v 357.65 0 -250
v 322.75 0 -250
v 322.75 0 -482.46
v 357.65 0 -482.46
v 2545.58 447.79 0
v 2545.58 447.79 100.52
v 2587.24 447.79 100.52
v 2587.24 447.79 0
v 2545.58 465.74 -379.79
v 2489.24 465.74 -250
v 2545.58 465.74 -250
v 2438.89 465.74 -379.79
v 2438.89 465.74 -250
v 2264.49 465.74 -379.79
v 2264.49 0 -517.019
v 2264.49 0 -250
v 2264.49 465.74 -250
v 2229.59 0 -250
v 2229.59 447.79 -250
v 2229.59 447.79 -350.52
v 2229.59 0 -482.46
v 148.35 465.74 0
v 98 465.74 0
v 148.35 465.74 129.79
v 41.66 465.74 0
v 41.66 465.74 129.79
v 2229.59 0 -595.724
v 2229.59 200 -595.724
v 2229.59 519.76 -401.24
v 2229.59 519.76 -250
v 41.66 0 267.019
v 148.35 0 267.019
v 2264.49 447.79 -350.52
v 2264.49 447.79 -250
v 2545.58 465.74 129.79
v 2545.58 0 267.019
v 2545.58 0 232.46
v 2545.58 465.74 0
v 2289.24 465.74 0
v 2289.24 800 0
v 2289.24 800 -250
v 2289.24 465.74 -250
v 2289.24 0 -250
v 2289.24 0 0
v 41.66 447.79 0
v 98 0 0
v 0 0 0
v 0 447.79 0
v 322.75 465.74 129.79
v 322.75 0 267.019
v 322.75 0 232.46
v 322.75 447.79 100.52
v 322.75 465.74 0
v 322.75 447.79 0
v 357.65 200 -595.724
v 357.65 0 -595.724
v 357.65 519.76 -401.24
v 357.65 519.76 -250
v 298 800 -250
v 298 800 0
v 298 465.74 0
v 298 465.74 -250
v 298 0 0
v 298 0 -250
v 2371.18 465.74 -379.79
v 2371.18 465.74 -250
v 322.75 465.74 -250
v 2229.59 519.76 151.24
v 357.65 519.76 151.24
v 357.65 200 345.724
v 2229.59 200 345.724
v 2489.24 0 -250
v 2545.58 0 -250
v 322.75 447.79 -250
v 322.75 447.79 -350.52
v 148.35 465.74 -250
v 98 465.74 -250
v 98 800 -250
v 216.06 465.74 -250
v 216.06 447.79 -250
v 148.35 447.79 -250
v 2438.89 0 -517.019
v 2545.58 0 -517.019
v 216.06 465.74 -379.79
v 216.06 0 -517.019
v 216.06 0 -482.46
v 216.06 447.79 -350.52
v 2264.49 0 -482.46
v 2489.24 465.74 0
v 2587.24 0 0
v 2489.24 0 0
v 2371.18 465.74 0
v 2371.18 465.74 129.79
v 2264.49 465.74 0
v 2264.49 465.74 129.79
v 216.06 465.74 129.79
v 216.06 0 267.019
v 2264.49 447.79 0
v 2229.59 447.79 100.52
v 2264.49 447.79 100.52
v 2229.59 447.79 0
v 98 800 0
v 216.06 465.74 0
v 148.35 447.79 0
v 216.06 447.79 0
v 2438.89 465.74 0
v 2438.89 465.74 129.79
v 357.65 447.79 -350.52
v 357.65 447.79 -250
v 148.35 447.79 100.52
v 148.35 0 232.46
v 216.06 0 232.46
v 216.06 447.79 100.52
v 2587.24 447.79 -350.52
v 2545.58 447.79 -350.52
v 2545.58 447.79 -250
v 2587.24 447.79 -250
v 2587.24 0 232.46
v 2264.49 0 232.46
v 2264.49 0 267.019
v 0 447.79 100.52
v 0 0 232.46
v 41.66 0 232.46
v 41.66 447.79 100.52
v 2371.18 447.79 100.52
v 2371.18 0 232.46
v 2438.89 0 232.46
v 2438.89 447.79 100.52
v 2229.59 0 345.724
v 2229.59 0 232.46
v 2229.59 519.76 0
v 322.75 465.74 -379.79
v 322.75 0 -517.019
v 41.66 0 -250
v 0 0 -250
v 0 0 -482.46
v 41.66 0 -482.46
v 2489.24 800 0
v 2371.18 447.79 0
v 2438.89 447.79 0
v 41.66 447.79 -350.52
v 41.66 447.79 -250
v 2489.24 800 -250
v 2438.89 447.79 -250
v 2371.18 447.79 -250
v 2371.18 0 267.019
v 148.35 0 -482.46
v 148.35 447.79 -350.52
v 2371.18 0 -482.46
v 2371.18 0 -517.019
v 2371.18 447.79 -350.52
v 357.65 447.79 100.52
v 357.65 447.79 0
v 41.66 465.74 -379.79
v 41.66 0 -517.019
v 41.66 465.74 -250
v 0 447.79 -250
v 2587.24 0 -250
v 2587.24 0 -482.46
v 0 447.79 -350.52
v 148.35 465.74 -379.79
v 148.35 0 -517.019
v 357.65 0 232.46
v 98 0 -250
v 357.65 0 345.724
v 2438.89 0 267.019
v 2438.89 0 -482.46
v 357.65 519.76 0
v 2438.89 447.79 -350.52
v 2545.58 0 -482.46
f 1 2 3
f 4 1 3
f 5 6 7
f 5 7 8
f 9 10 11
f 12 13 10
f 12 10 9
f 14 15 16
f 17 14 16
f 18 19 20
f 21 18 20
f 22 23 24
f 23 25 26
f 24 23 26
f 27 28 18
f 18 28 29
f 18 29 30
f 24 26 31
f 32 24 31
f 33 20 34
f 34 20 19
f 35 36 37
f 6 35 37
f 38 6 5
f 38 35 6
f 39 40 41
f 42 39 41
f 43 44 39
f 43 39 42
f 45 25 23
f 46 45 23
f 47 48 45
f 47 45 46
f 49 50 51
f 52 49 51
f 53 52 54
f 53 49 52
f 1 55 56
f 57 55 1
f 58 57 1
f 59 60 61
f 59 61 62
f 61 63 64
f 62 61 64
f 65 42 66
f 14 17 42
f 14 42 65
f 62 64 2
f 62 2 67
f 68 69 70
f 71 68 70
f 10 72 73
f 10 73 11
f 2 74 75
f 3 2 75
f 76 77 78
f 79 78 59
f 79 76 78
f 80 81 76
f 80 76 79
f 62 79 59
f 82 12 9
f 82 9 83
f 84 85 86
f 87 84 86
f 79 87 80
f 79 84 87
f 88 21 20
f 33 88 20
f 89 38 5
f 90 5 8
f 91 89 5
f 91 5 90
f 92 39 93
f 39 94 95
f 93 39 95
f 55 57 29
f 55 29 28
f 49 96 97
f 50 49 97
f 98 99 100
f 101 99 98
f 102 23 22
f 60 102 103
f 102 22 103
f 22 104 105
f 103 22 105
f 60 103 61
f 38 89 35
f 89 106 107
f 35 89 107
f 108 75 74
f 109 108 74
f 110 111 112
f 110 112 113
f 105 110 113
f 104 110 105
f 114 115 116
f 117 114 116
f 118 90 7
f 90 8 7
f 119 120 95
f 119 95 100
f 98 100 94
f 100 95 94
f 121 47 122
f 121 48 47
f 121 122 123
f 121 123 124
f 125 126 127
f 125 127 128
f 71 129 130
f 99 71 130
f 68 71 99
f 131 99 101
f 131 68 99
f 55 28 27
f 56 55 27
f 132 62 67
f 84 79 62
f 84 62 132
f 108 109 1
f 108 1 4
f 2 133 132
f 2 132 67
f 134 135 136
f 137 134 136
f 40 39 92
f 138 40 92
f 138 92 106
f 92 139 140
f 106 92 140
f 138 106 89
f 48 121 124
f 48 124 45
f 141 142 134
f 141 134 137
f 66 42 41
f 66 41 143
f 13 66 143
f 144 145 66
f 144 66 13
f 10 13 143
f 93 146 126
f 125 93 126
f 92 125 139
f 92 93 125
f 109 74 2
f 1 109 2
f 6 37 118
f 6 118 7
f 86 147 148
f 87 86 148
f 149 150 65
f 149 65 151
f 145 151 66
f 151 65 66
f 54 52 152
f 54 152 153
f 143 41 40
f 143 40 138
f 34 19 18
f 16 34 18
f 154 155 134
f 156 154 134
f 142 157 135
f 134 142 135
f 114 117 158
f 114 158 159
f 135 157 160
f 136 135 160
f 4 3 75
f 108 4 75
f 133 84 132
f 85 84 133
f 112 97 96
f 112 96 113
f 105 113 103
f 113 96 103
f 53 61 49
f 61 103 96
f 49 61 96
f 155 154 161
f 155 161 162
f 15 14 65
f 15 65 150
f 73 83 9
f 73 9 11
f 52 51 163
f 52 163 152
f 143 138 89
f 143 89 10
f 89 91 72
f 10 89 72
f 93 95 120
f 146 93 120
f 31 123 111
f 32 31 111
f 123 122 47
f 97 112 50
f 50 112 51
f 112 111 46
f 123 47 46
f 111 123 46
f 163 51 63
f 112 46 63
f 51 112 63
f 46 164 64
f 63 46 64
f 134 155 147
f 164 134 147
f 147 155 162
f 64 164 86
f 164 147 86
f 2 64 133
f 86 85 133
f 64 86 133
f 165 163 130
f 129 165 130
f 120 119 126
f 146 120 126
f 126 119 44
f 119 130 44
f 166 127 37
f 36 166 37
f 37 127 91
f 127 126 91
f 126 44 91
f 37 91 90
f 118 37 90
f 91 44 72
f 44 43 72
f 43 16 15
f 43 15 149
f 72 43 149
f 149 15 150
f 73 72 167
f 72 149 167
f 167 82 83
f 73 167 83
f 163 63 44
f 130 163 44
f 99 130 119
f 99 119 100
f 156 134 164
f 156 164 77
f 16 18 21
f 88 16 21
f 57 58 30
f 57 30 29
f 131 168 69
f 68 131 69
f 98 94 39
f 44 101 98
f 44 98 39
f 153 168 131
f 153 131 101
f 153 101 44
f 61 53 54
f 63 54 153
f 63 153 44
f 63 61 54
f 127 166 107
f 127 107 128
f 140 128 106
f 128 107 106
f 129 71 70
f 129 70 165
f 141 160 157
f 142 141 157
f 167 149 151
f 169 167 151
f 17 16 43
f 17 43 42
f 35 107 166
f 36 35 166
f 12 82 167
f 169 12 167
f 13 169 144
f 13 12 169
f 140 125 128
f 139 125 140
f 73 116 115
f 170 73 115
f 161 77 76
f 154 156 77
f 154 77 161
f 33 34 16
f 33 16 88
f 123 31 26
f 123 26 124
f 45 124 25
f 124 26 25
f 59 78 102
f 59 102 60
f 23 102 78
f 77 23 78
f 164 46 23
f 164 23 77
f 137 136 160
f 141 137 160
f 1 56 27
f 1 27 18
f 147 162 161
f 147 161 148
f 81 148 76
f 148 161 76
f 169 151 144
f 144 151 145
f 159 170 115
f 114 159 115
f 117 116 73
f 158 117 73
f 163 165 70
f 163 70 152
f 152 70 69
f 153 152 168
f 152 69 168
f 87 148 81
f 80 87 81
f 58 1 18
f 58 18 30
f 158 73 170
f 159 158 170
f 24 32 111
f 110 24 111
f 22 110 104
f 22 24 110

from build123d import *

# Parameters (mm, degrees)
EXTRUDE_1_DEPTH   = 41.66
EXTRUDE_1_2_DEPTH = 41.66
EXTRUDE_2_DEPTH   = 106.69
EXTRUDE_START     = 148.35
EXTRUDE_3_DEPTH   = 67.71
EXTRUDE_START_2   = 174.4
EXTRUDE_4_DEPTH   = 106.69
EXTRUDE_START_3   = 322.75
EXTRUDE_5_DEPTH   = 34.9
EXTRUDE_6_DEPTH   = 1871.94
EXTRUDE_START_4   = 2229.59
EXTRUDE_9_DEPTH   = 34.9
EXTRUDE_START_5   = 2222.83
EXTRUDE_10_DEPTH  = 106.69
EXTRUDE_START_6   = 2371.18
EXTRUDE_11_DEPTH  = 67.71
EXTRUDE_START_7   = 2397.23
EXTRUDE_12_DEPTH  = 106.69
EXTRUDE_START_8   = 2545.58
EXTRUDE_13_DEPTH  = 41.66
SKETCH_4_W        = 200
SKETCH_4_H        = 250
EXTRUDE_14_DEPTH  = 800


with BuildPart() as part:
    # 草图1 → 凸台-拉伸1 (new body)
    with BuildSketch(Plane(origin=(0, 0, 0), x_dir=(0, 0, -1), z_dir=(1, 0, 0))):
        Polygon((0, 0), (-232.46, 0), (-100.52, 447.79), (0, 447.79), align=None)
    extrude(amount=EXTRUDE_1_DEPTH)

    # 草图2 → 凸台-拉伸2 (add)
    with BuildSketch(Plane(origin=(41.66, 0, 0), x_dir=(0, 0, -1), z_dir=(1, 0, 0))):
        Polygon((0, 465.74), (-129.79, 465.74), (-267.018914447, 0), (0, 0), align=None)
        Polygon((250, 0), (250, 465.74), (379.79, 465.74), (517.018914447, 0), align=None)
    extrude(amount=EXTRUDE_2_DEPTH)


with BuildPart() as body_2:
    # 草图1 → Extrude 1 2 (new body)
    with BuildSketch(Plane(origin=(0, 0, 0), x_dir=(0, 0, -1), z_dir=(1, 0, 0))):
        Polygon((250, 447.79), (250, 0), (482.46, 0), (350.52, 447.79), align=None)
    extrude(amount=EXTRUDE_1_2_DEPTH)


with BuildPart() as extrude_2_piece_1:
    # of the separate pieces the step leaves, piece 1, a body of its own (extrude_2_pieces)
    add(part.part.solids().sort_by_distance((0, 0, 0))[0])

    # 草图1<2> → 凸台-拉伸3 (add)
    with BuildSketch(Plane(origin=(0, 0, 0), x_dir=(0, 0, -1), z_dir=(1, 0, 0)).offset(EXTRUDE_START)):
        Polygon((0, 0), (-232.46, 0), (-100.52, 447.79), (0, 447.79), align=None)
        Polygon((250, 447.79), (250, 0), (482.46, 0), (350.52, 447.79), align=None)
    extrude(amount=EXTRUDE_3_DEPTH)


with BuildPart() as extrude_2_piece_2:
    # of the separate pieces the step leaves, piece 2, a body of its own (extrude_2_pieces)
    add(part.part.solids().sort_by_distance((41.66, 0, -250))[0])



with BuildPart() as extrude_3_piece_1:
    # of the separate pieces the step leaves, piece 1, a body of its own (extrude_3_pieces)
    add(extrude_2_piece_1.part.solids().sort_by_distance((0, 0, 0))[0])

    # 草图2<2> → 凸台-拉伸4 (add)
    with BuildSketch(Plane(origin=(41.66, 0, 0), x_dir=(0, 0, -1), z_dir=(1, 0, 0)).offset(EXTRUDE_START_2)):
        Polygon((0, 465.74), (-129.79, 465.74), (-267.018914447, 0), (0, 0), align=None)
        Polygon((250, 0), (250, 465.74), (379.79, 465.74), (517.018914447, 0), align=None)
    extrude(amount=EXTRUDE_4_DEPTH)


with BuildPart() as extrude_3_piece_2:
    # of the separate pieces the step leaves, piece 2, a body of its own (extrude_3_pieces)
    add(extrude_2_piece_1.part.solids().sort_by_distance((148.35, 447.79, -250))[0])


with BuildPart() as extrude_4_piece_1:
    # of the separate pieces the step leaves, piece 1, a body of its own (extrude_4_pieces)
    add(extrude_3_piece_1.part.solids().sort_by_distance((0, 0, 0))[0])

    # 草图1<3> → 凸台-拉伸5 (add)
    with BuildSketch(Plane(origin=(0, 0, 0), x_dir=(0, 0, -1), z_dir=(1, 0, 0)).offset(EXTRUDE_START_3)):
        Polygon((0, 0), (-232.46, 0), (-100.52, 447.79), (0, 447.79), align=None)
        Polygon((250, 447.79), (250, 0), (482.46, 0), (350.52, 447.79), align=None)
    extrude(amount=EXTRUDE_5_DEPTH)


with BuildPart() as extrude_4_piece_2:
    # of the separate pieces the step leaves, piece 2, a body of its own (extrude_4_pieces)
    add(extrude_3_piece_1.part.solids().sort_by_distance((216.06, 0, -250))[0])


with BuildPart() as extrude_5_piece_1:
    # of the separate pieces the step leaves, piece 1, a body of its own (extrude_5_pieces)
    add(extrude_4_piece_1.part.solids().sort_by_distance((0, 0, 0))[0])

    # 草图3 → 凸台-拉伸6 (add)
    with BuildSketch(Plane(origin=(357.65, 0, 0), x_dir=(0, 0, -1), z_dir=(1, 0, 0))):
        Polygon((0, 0), (0, 519.76), (-151.24, 519.76), (-345.72416388, 200), (-345.72416388, 0), align=None)
        Polygon((595.72416388, 0), (250, 0), (250, 519.76), (401.24, 519.76), (595.72416388, 200), align=None)
    extrude(amount=EXTRUDE_6_DEPTH)


with BuildPart() as extrude_5_piece_2:
    # of the separate pieces the step leaves, piece 2, a body of its own (extrude_5_pieces)
    add(extrude_4_piece_1.part.solids().sort_by_distance((322.75, 447.79, -250))[0])


with BuildPart() as extrude_6_piece_1:
    # of the separate pieces the step leaves, piece 1, a body of its own (extrude_6_pieces)
    add(extrude_5_piece_1.part.solids().sort_by_distance((0, 0, 0))[0])

    # 草图1<4> → 凸台-拉伸9 (add)
    with BuildSketch(Plane(origin=(0, 0, 0), x_dir=(0, 0, -1), z_dir=(1, 0, 0)).offset(EXTRUDE_START_4)):
        Polygon((0, 0), (-232.46, 0), (-100.52, 447.79), (0, 447.79), align=None)
        Polygon((250, 447.79), (250, 0), (482.46, 0), (350.52, 447.79), align=None)
    extrude(amount=EXTRUDE_9_DEPTH)


with BuildPart() as extrude_6_piece_2:
    # of the separate pieces the step leaves, piece 2, a body of its own (extrude_6_pieces)
    add(extrude_5_piece_1.part.solids().sort_by_distance((357.65, 0, -595.72416388))[0])


with BuildPart() as extrude_9_piece_1:
    # of the separate pieces the step leaves, piece 1, a body of its own (extrude_9_pieces)
    add(extrude_6_piece_1.part.solids().sort_by_distance((0, 0, 0))[0])

    # 草图2<8> → 凸台-拉伸10 (add)
    with BuildSketch(Plane(origin=(41.66, 0, 0), x_dir=(0, 0, -1), z_dir=(1, 0, 0)).offset(EXTRUDE_START_5)):
        Polygon((0, 465.74), (-129.79, 465.74), (-267.018914447, 0), (0, 0), align=None)
        Polygon((250, 0), (250, 465.74), (379.79, 465.74), (517.018914447, 0), align=None)
    extrude(amount=EXTRUDE_10_DEPTH)


with BuildPart() as extrude_9_piece_2:
    # of the separate pieces the step leaves, piece 2, a body of its own (extrude_9_pieces)
    add(extrude_6_piece_1.part.solids().sort_by_distance((2229.59, 447.79, -250))[0])


with BuildPart() as extrude_10_piece_1:
    # of the separate pieces the step leaves, piece 1, a body of its own (extrude_10_pieces)
    add(extrude_9_piece_1.part.solids().sort_by_distance((0, 0, 0))[0])

    # 草图1<5> → 凸台-拉伸11 (add)
    with BuildSketch(Plane(origin=(0, 0, 0), x_dir=(0, 0, -1), z_dir=(1, 0, 0)).offset(EXTRUDE_START_6)):
        Polygon((0, 0), (-232.46, 0), (-100.52, 447.79), (0, 447.79), align=None)
        Polygon((250, 447.79), (250, 0), (482.46, 0), (350.52, 447.79), align=None)
    extrude(amount=EXTRUDE_11_DEPTH)


with BuildPart() as extrude_10_piece_2:
    # of the separate pieces the step leaves, piece 2, a body of its own (extrude_10_pieces)
    add(extrude_9_piece_1.part.solids().sort_by_distance((2264.49, 0, -250))[0])


with BuildPart() as extrude_11_piece_1:
    # of the separate pieces the step leaves, piece 1, a body of its own (extrude_11_pieces)
    add(extrude_10_piece_1.part.solids().sort_by_distance((0, 0, 0))[0])

    # 草图2<10> → 凸台-拉伸12 (add)
    with BuildSketch(Plane(origin=(41.66, 0, 0), x_dir=(0, 0, -1), z_dir=(1, 0, 0)).offset(EXTRUDE_START_7)):
        Polygon((0, 465.74), (-129.79, 465.74), (-267.018914447, 0), (0, 0), align=None)
        Polygon((250, 0), (250, 465.74), (379.79, 465.74), (517.018914447, 0), align=None)
    extrude(amount=EXTRUDE_12_DEPTH)


with BuildPart() as extrude_11_piece_2:
    # of the separate pieces the step leaves, piece 2, a body of its own (extrude_11_pieces)
    add(extrude_10_piece_1.part.solids().sort_by_distance((2371.18, 447.79, -250))[0])


with BuildPart() as extrude_12_piece_1:
    # of the separate pieces the step leaves, piece 1, a body of its own (extrude_12_pieces)
    add(extrude_11_piece_1.part.solids().sort_by_distance((0, 0, 0))[0])

    # 草图1<6> → 凸台-拉伸13 (add)
    with BuildSketch(Plane(origin=(0, 0, 0), x_dir=(0, 0, -1), z_dir=(1, 0, 0)).offset(EXTRUDE_START_8)):
        Polygon((0, 0), (-232.46, 0), (-100.52, 447.79), (0, 447.79), align=None)
        Polygon((250, 447.79), (250, 0), (482.46, 0), (350.52, 447.79), align=None)
    extrude(amount=EXTRUDE_13_DEPTH)


with BuildPart() as extrude_12_piece_2:
    # of the separate pieces the step leaves, piece 2, a body of its own (extrude_12_pieces)
    add(extrude_11_piece_1.part.solids().sort_by_distance((2438.89, 0, -250))[0])


with BuildPart() as extrude_13_piece_1:
    # of the separate pieces the step leaves, piece 1, a body of its own (extrude_13_pieces)
    add(extrude_12_piece_1.part.solids().sort_by_distance((0, 0, 0))[0])


with BuildPart() as extrude_13_piece_2:
    # of the separate pieces the step leaves, piece 2, a body of its own (extrude_13_pieces)
    add(extrude_12_piece_1.part.solids().sort_by_distance((2545.58, 447.79, -250))[0])


with BuildPart() as extrude_2_piece_2_1:
    add(extrude_2_piece_2.part)

    add(extrude_3_piece_2.part)  # 凸台-拉伸14 merges 凸台-拉伸3 piece 2

    add(extrude_4_piece_2.part)  # 凸台-拉伸14 merges 凸台-拉伸4 piece 2

    add(extrude_10_piece_2.part)  # 凸台-拉伸14 merges 凸台-拉伸10 piece 2

    add(extrude_11_piece_2.part)  # 凸台-拉伸14 merges 凸台-拉伸11 piece 2

    add(extrude_12_piece_2.part)  # 凸台-拉伸14 merges 凸台-拉伸12 piece 2

    add(extrude_13_piece_1.part)  # 凸台-拉伸14 merges 凸台-拉伸13 piece 1
    # 草图4 → 凸台-拉伸14 (add)
    with BuildSketch(Plane(origin=(0, 0, 0), x_dir=(1, 0, 0), z_dir=(0, 1, 0))):
        with Locations((198, 125)):
            Rectangle(SKETCH_4_W, SKETCH_4_H)
        with Locations((2389.24, 125)):
            Rectangle(SKETCH_4_W, SKETCH_4_H)
    extrude(amount=EXTRUDE_14_DEPTH)


solid = Compound([body_2.part, extrude_5_piece_2.part, extrude_6_piece_2.part, extrude_9_piece_2.part, extrude_13_piece_2.part, extrude_2_piece_2_1.part])
